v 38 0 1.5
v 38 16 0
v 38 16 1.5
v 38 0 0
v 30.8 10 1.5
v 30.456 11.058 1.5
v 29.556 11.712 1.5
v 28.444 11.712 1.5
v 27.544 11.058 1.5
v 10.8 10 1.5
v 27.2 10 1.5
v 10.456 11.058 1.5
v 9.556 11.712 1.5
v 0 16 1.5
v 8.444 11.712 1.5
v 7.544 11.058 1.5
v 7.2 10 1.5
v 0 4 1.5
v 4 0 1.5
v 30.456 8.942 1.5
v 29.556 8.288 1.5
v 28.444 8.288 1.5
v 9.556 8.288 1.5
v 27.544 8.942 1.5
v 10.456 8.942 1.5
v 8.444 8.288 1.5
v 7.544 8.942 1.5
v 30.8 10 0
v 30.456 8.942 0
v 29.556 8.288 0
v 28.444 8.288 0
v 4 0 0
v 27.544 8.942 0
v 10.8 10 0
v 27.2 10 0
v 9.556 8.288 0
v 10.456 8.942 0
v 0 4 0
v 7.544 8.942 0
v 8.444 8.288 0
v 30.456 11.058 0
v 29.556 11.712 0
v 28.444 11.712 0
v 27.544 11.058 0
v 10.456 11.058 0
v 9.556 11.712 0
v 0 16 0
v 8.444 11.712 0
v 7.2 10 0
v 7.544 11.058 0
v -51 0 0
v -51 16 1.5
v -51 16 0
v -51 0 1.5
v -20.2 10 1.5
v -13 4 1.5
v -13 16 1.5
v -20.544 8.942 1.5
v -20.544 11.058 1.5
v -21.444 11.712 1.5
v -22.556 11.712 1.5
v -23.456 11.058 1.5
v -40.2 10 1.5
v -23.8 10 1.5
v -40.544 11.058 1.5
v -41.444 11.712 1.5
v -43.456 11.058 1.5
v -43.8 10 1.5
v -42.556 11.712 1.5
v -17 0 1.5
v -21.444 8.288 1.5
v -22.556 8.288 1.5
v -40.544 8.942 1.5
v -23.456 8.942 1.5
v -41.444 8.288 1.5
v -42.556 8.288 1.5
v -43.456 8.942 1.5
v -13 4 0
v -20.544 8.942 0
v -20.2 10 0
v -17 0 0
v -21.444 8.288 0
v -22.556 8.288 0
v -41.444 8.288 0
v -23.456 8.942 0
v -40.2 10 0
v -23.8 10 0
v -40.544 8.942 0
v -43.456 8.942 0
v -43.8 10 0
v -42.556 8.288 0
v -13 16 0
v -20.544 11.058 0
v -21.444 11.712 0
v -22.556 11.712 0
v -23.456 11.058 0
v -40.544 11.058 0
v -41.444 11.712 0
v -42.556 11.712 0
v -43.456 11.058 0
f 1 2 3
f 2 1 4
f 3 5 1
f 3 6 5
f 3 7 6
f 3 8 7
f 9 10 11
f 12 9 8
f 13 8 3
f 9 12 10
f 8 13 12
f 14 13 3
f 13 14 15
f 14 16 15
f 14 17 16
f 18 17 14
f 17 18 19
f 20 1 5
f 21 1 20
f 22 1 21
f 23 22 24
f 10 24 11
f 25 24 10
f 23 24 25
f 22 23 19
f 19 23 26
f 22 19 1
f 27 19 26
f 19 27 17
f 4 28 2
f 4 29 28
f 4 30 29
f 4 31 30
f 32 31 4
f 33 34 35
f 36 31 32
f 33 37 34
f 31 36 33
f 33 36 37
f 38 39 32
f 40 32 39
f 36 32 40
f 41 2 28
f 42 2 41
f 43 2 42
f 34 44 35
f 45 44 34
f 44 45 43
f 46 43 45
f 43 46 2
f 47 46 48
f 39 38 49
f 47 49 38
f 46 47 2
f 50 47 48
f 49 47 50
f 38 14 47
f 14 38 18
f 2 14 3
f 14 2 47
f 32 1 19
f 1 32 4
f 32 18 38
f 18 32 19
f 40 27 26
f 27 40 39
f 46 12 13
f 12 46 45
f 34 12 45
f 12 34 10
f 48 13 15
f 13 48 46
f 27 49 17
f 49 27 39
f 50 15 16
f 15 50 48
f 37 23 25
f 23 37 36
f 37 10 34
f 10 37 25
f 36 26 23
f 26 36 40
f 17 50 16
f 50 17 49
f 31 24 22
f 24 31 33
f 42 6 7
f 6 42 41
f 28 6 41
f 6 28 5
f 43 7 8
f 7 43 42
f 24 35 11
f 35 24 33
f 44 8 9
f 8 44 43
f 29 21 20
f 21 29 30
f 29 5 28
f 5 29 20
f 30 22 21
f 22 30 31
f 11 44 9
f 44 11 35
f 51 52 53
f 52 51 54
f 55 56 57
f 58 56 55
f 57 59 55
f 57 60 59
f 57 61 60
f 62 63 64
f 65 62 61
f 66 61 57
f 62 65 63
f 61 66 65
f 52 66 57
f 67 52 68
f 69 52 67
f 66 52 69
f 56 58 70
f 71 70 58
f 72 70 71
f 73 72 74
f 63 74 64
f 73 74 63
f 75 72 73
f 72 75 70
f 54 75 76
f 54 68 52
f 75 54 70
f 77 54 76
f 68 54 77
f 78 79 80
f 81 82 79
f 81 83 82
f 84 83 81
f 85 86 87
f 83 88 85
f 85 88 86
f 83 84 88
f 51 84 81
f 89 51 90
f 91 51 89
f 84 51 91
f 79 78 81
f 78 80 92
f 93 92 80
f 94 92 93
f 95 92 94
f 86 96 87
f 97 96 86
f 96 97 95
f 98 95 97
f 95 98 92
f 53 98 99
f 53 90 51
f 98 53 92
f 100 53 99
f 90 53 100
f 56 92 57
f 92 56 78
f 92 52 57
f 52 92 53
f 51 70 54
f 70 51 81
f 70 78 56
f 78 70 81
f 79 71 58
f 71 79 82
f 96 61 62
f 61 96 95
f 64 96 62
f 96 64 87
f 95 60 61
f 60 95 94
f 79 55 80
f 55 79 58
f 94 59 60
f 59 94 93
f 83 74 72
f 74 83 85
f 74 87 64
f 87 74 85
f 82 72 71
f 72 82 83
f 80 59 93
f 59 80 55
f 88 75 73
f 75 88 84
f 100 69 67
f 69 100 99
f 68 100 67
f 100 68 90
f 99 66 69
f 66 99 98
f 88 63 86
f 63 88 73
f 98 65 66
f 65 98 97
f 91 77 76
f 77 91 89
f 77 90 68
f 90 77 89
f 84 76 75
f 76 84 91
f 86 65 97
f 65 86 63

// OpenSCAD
// Thickness of separation
sep = 1.5;

module z_top_sep_base() {
  difference() {
    cube([38,16,sep]);
    translate([5,-1,-1]) rotate([0,0,135]) cube([10,10,2+sep]);
  }
}

module z_top_sep_holes() {
  // holes
  translate([9,10,-1]) cylinder(r = 1.8, h = 2+sep, $fn = 10);
  translate([29,10,-1]) cylinder(r = 1.8, h = 2+sep, $fn = 10);
}

module z_top_sep() {
  difference() {
    z_top_sep_base();
    z_top_sep_holes();
  }
}

z_top_sep();
translate([-13,0,0]) mirror([1,0,0]) z_top_sep();
